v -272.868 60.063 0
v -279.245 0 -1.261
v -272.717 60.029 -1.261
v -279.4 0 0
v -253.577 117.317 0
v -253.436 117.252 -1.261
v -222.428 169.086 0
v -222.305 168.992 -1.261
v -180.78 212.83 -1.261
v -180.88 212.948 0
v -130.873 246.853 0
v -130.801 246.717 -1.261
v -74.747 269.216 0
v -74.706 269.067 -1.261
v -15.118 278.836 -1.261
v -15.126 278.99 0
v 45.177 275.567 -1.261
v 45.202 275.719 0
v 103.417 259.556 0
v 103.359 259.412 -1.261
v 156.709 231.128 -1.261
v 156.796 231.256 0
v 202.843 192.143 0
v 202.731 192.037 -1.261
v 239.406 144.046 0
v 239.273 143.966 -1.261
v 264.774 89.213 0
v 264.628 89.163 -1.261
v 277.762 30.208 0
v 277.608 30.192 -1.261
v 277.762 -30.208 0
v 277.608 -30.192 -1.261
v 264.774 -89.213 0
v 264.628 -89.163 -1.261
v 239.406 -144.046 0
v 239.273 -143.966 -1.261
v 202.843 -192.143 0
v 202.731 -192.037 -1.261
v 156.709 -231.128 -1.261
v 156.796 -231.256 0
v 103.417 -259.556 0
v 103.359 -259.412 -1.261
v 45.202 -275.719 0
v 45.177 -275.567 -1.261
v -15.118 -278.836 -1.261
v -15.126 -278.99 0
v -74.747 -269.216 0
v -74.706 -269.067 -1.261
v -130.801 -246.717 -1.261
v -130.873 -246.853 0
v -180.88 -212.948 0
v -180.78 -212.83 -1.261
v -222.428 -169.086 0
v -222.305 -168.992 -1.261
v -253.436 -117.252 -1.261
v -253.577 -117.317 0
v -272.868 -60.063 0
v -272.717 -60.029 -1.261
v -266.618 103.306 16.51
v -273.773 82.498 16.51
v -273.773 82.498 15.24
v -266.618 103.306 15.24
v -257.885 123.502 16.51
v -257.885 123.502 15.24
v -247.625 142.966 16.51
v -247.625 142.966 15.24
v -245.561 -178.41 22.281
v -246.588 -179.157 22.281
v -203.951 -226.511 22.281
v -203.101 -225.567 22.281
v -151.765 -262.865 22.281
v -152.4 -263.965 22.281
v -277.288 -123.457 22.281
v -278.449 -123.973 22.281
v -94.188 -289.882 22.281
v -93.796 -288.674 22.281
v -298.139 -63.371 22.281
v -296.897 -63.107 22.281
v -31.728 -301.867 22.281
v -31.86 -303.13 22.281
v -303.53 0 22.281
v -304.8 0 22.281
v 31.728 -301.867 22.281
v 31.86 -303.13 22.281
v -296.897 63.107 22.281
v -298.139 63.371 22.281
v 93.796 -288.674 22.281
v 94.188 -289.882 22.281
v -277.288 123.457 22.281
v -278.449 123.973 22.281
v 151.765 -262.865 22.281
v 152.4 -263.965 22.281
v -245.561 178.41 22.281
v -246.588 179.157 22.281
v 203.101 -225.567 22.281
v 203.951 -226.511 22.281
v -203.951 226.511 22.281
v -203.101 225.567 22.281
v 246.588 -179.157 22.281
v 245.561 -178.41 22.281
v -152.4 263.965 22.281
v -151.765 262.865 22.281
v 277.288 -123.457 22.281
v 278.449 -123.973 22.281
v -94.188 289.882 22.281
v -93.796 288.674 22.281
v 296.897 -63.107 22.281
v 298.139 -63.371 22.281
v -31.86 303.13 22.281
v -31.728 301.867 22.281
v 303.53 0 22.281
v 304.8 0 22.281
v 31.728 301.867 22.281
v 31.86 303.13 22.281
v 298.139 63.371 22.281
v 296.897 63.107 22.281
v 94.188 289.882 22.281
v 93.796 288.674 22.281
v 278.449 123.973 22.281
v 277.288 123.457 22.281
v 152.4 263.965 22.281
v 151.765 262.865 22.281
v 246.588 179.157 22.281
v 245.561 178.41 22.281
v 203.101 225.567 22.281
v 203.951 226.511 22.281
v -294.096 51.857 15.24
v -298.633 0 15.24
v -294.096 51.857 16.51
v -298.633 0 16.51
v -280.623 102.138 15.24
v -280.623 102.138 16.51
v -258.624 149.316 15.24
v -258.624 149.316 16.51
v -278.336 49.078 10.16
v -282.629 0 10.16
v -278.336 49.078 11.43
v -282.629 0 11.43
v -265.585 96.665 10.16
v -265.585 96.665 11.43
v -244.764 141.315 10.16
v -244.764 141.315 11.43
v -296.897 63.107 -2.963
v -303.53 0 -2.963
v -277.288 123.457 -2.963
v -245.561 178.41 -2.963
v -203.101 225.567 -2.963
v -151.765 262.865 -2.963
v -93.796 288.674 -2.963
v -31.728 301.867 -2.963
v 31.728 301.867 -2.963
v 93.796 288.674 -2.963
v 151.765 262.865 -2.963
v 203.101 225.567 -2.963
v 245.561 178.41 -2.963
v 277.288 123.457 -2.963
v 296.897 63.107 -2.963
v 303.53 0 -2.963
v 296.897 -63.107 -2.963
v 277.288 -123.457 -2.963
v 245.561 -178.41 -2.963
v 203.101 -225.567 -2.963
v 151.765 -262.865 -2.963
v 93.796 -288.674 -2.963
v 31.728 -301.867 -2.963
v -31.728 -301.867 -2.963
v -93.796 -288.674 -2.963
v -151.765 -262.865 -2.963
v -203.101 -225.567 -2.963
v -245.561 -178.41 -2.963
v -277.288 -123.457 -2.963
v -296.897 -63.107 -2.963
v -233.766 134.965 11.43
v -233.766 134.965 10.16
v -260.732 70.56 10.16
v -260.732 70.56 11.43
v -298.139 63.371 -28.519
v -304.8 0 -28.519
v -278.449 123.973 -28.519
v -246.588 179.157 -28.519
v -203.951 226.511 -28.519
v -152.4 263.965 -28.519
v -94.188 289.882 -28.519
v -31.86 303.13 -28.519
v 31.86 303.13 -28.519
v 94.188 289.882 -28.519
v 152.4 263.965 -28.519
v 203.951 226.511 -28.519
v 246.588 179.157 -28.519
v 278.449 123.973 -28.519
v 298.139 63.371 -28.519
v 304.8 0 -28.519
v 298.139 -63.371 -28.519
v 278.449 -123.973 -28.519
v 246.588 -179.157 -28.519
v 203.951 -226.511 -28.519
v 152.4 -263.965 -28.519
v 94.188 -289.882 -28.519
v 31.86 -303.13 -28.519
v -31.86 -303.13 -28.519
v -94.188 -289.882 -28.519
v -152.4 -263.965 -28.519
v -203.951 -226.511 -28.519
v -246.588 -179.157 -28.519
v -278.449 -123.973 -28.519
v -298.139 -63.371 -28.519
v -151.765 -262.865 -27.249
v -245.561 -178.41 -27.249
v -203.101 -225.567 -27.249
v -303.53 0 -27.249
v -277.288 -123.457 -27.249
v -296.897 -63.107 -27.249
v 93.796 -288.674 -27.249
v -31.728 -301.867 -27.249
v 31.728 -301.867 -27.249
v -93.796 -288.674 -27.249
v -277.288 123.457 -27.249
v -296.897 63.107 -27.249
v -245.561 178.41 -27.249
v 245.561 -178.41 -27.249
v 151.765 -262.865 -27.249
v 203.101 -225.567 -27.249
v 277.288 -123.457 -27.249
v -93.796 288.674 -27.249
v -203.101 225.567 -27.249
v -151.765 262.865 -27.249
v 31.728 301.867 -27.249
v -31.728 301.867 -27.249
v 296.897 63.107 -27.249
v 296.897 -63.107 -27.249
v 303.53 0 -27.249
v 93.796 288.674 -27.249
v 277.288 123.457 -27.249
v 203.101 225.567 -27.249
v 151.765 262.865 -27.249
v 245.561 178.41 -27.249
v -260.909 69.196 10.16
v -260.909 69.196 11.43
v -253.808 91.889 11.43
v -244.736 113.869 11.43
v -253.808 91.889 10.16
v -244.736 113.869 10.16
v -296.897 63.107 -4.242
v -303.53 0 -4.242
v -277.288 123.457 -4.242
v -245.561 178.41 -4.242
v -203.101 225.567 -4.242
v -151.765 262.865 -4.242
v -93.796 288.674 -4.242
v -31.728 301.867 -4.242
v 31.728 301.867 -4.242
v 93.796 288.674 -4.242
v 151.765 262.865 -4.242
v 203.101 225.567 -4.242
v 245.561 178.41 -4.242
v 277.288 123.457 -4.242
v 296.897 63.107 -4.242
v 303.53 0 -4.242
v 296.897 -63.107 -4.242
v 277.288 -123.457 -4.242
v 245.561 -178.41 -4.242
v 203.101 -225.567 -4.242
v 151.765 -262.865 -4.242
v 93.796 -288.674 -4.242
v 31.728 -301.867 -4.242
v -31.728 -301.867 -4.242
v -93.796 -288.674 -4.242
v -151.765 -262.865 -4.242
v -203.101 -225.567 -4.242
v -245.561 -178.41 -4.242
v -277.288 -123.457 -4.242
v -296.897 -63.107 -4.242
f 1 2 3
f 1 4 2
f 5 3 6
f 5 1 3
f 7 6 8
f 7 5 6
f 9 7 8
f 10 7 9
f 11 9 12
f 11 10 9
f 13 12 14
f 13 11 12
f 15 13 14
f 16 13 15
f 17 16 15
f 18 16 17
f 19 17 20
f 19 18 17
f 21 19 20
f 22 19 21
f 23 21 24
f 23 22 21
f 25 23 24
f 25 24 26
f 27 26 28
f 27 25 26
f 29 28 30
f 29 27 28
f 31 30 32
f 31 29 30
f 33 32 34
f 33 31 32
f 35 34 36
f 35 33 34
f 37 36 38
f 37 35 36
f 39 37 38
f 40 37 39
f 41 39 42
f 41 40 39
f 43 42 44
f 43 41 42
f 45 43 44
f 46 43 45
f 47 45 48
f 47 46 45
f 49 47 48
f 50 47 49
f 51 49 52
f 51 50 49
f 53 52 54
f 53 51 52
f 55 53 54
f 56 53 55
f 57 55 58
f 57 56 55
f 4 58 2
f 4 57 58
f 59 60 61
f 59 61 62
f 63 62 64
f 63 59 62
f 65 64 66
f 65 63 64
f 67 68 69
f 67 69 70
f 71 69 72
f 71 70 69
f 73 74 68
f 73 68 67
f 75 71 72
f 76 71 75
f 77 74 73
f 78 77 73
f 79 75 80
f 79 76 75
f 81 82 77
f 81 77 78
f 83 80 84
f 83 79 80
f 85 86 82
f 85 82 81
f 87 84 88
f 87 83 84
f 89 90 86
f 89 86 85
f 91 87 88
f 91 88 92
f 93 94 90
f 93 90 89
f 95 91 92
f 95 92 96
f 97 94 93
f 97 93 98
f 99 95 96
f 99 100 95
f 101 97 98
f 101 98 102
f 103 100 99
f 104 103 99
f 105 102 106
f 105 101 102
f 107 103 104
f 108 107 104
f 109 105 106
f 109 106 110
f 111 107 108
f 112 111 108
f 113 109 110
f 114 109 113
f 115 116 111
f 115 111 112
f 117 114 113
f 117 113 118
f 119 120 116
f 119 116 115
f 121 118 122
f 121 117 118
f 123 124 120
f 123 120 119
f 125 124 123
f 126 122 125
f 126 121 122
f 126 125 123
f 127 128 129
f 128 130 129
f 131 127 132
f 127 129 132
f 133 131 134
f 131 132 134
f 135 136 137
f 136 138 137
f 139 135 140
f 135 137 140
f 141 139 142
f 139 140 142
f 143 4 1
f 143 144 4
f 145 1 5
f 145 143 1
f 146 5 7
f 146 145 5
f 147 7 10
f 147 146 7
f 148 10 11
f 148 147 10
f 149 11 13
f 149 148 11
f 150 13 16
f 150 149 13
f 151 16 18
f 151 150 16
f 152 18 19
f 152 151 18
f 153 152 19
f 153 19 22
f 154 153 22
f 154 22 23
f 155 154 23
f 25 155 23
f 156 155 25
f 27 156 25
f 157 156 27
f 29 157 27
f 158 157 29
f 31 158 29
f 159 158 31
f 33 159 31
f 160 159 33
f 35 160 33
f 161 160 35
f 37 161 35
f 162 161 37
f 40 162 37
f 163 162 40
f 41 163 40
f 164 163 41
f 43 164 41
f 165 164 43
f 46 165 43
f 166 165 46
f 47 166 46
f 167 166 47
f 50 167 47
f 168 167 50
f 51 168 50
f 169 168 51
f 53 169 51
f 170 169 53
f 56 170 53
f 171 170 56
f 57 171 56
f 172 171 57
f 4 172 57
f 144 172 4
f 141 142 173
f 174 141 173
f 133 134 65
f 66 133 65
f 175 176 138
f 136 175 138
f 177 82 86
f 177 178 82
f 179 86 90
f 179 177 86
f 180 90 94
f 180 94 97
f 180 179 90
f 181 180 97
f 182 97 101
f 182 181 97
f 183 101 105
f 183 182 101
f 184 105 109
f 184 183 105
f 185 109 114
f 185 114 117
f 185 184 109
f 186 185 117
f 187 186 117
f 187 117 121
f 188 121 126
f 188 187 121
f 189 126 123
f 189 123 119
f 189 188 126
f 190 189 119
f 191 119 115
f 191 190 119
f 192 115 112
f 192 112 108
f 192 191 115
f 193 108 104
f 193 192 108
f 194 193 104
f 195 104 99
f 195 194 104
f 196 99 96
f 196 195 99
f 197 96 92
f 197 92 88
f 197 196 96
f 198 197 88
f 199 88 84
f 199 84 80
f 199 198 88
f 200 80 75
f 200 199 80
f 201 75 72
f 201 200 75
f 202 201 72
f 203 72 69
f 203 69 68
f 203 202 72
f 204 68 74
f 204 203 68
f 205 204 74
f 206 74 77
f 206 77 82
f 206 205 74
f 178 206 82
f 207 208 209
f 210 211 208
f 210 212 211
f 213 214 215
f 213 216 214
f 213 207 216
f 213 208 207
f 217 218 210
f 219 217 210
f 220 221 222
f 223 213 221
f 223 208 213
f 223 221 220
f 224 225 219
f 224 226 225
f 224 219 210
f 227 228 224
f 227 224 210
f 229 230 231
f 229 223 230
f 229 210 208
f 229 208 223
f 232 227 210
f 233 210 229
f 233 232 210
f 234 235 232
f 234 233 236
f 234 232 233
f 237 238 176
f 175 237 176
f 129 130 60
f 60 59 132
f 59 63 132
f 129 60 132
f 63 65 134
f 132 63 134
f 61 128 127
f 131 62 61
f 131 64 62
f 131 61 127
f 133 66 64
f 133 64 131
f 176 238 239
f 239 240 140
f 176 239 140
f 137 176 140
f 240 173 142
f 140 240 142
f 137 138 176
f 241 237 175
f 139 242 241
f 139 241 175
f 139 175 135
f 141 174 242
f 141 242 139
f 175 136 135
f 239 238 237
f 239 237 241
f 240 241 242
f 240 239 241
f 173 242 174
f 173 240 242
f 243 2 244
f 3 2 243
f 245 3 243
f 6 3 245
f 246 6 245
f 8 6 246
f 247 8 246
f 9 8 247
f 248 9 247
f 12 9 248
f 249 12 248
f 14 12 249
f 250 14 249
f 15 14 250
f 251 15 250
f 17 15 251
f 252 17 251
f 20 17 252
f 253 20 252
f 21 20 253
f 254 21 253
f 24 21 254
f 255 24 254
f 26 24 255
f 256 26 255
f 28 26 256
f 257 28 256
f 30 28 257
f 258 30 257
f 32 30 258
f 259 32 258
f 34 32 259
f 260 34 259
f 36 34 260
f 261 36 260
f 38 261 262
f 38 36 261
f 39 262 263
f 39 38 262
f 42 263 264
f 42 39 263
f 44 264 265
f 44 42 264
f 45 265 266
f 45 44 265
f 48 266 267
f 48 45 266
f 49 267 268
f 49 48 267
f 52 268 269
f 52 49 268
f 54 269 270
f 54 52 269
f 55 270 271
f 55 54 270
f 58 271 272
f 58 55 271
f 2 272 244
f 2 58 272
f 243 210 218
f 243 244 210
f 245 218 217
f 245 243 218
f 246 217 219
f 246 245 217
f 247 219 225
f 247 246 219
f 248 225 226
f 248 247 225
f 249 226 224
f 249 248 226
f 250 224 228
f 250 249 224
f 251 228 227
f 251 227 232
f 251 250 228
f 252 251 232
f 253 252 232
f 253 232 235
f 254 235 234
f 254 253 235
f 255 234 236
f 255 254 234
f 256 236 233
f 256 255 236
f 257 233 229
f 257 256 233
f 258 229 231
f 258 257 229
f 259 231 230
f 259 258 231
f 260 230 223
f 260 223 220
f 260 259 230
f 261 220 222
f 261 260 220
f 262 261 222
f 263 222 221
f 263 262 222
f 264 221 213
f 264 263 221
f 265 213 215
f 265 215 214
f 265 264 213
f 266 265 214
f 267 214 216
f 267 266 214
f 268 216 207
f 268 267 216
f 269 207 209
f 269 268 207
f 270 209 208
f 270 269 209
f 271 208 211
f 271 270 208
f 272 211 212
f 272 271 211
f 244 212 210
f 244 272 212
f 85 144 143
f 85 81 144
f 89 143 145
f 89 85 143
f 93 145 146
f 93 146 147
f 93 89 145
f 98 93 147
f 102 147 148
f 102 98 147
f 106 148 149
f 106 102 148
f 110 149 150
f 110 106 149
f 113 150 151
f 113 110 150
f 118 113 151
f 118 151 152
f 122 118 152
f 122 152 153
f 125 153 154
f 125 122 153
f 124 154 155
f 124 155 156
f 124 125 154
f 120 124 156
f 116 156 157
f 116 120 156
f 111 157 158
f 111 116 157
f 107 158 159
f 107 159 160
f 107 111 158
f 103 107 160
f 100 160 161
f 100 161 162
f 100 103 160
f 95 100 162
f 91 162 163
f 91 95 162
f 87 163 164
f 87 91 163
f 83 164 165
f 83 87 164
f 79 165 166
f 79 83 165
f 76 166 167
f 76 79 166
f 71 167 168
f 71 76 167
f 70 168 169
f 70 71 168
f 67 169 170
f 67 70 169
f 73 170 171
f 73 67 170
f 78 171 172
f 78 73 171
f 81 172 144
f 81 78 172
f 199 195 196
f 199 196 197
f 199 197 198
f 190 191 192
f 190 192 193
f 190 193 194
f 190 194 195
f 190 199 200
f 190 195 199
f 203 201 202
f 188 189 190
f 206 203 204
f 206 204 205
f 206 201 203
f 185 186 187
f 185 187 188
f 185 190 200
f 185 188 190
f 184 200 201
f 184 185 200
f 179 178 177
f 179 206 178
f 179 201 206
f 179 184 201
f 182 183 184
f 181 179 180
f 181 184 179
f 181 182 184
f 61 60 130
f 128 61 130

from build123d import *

# Parameters (mm, degrees)
F3_W     = 12.7
F3_H     = 1.27
F4_ANGLE = 30
F7_DEPTH = 1.27
F8_DEPTH = 1.27


with BuildPart() as f2:
    # F0 (on Front) → F2 (revolve)
    with BuildSketch(Plane.XZ):
        Polygon((-304.8, 22.281272), (-304.8, -3.118728), (-304.8, -28.518728), (0, -28.518728), (0, -27.248728), (-303.53, -27.248728), (-303.53, -4.242329), (-279.245226, -1.260534), (-279.4, 0), (-303.53, -2.962791), (-303.53, 22.281272), align=None)
    revolve(axis=Axis((0, 0, -10.939999), (0, 0, -1)))


with BuildPart() as f4:
    # F3 (on Front) → F4 (revolve)
    with BuildSketch(Plane.XZ):
        with Locations((-276.279379, 10.795)):
            Rectangle(F3_W, F3_H)
        with Locations((-292.282711, 15.875)):
            Rectangle(F3_W, F3_H)
    revolve(axis=Axis((0, 0, -10.939999), (0, 0, -1)), revolution_arc=F4_ANGLE)

    # F5 (on face) → F7 (cut, through all)
    with BuildSketch(Plane.XY.offset(16.51)):
        Polygon((-273.772806, 82.498279), (-298.632711, 0), (-285.932711, 0), align=None)
    extrude(amount=-F7_DEPTH, mode=Mode.SUBTRACT)

    # F6 (on face) → F8 (cut, through all)
    with BuildSketch(Plane.XY.offset(11.43)):
        Polygon((-260.731759, 70.55958), (-282.629379, 0), (-269.929379, 0), align=None)
    extrude(amount=-F8_DEPTH, mode=Mode.SUBTRACT)


solid = Compound([f2.part, f4.part])
